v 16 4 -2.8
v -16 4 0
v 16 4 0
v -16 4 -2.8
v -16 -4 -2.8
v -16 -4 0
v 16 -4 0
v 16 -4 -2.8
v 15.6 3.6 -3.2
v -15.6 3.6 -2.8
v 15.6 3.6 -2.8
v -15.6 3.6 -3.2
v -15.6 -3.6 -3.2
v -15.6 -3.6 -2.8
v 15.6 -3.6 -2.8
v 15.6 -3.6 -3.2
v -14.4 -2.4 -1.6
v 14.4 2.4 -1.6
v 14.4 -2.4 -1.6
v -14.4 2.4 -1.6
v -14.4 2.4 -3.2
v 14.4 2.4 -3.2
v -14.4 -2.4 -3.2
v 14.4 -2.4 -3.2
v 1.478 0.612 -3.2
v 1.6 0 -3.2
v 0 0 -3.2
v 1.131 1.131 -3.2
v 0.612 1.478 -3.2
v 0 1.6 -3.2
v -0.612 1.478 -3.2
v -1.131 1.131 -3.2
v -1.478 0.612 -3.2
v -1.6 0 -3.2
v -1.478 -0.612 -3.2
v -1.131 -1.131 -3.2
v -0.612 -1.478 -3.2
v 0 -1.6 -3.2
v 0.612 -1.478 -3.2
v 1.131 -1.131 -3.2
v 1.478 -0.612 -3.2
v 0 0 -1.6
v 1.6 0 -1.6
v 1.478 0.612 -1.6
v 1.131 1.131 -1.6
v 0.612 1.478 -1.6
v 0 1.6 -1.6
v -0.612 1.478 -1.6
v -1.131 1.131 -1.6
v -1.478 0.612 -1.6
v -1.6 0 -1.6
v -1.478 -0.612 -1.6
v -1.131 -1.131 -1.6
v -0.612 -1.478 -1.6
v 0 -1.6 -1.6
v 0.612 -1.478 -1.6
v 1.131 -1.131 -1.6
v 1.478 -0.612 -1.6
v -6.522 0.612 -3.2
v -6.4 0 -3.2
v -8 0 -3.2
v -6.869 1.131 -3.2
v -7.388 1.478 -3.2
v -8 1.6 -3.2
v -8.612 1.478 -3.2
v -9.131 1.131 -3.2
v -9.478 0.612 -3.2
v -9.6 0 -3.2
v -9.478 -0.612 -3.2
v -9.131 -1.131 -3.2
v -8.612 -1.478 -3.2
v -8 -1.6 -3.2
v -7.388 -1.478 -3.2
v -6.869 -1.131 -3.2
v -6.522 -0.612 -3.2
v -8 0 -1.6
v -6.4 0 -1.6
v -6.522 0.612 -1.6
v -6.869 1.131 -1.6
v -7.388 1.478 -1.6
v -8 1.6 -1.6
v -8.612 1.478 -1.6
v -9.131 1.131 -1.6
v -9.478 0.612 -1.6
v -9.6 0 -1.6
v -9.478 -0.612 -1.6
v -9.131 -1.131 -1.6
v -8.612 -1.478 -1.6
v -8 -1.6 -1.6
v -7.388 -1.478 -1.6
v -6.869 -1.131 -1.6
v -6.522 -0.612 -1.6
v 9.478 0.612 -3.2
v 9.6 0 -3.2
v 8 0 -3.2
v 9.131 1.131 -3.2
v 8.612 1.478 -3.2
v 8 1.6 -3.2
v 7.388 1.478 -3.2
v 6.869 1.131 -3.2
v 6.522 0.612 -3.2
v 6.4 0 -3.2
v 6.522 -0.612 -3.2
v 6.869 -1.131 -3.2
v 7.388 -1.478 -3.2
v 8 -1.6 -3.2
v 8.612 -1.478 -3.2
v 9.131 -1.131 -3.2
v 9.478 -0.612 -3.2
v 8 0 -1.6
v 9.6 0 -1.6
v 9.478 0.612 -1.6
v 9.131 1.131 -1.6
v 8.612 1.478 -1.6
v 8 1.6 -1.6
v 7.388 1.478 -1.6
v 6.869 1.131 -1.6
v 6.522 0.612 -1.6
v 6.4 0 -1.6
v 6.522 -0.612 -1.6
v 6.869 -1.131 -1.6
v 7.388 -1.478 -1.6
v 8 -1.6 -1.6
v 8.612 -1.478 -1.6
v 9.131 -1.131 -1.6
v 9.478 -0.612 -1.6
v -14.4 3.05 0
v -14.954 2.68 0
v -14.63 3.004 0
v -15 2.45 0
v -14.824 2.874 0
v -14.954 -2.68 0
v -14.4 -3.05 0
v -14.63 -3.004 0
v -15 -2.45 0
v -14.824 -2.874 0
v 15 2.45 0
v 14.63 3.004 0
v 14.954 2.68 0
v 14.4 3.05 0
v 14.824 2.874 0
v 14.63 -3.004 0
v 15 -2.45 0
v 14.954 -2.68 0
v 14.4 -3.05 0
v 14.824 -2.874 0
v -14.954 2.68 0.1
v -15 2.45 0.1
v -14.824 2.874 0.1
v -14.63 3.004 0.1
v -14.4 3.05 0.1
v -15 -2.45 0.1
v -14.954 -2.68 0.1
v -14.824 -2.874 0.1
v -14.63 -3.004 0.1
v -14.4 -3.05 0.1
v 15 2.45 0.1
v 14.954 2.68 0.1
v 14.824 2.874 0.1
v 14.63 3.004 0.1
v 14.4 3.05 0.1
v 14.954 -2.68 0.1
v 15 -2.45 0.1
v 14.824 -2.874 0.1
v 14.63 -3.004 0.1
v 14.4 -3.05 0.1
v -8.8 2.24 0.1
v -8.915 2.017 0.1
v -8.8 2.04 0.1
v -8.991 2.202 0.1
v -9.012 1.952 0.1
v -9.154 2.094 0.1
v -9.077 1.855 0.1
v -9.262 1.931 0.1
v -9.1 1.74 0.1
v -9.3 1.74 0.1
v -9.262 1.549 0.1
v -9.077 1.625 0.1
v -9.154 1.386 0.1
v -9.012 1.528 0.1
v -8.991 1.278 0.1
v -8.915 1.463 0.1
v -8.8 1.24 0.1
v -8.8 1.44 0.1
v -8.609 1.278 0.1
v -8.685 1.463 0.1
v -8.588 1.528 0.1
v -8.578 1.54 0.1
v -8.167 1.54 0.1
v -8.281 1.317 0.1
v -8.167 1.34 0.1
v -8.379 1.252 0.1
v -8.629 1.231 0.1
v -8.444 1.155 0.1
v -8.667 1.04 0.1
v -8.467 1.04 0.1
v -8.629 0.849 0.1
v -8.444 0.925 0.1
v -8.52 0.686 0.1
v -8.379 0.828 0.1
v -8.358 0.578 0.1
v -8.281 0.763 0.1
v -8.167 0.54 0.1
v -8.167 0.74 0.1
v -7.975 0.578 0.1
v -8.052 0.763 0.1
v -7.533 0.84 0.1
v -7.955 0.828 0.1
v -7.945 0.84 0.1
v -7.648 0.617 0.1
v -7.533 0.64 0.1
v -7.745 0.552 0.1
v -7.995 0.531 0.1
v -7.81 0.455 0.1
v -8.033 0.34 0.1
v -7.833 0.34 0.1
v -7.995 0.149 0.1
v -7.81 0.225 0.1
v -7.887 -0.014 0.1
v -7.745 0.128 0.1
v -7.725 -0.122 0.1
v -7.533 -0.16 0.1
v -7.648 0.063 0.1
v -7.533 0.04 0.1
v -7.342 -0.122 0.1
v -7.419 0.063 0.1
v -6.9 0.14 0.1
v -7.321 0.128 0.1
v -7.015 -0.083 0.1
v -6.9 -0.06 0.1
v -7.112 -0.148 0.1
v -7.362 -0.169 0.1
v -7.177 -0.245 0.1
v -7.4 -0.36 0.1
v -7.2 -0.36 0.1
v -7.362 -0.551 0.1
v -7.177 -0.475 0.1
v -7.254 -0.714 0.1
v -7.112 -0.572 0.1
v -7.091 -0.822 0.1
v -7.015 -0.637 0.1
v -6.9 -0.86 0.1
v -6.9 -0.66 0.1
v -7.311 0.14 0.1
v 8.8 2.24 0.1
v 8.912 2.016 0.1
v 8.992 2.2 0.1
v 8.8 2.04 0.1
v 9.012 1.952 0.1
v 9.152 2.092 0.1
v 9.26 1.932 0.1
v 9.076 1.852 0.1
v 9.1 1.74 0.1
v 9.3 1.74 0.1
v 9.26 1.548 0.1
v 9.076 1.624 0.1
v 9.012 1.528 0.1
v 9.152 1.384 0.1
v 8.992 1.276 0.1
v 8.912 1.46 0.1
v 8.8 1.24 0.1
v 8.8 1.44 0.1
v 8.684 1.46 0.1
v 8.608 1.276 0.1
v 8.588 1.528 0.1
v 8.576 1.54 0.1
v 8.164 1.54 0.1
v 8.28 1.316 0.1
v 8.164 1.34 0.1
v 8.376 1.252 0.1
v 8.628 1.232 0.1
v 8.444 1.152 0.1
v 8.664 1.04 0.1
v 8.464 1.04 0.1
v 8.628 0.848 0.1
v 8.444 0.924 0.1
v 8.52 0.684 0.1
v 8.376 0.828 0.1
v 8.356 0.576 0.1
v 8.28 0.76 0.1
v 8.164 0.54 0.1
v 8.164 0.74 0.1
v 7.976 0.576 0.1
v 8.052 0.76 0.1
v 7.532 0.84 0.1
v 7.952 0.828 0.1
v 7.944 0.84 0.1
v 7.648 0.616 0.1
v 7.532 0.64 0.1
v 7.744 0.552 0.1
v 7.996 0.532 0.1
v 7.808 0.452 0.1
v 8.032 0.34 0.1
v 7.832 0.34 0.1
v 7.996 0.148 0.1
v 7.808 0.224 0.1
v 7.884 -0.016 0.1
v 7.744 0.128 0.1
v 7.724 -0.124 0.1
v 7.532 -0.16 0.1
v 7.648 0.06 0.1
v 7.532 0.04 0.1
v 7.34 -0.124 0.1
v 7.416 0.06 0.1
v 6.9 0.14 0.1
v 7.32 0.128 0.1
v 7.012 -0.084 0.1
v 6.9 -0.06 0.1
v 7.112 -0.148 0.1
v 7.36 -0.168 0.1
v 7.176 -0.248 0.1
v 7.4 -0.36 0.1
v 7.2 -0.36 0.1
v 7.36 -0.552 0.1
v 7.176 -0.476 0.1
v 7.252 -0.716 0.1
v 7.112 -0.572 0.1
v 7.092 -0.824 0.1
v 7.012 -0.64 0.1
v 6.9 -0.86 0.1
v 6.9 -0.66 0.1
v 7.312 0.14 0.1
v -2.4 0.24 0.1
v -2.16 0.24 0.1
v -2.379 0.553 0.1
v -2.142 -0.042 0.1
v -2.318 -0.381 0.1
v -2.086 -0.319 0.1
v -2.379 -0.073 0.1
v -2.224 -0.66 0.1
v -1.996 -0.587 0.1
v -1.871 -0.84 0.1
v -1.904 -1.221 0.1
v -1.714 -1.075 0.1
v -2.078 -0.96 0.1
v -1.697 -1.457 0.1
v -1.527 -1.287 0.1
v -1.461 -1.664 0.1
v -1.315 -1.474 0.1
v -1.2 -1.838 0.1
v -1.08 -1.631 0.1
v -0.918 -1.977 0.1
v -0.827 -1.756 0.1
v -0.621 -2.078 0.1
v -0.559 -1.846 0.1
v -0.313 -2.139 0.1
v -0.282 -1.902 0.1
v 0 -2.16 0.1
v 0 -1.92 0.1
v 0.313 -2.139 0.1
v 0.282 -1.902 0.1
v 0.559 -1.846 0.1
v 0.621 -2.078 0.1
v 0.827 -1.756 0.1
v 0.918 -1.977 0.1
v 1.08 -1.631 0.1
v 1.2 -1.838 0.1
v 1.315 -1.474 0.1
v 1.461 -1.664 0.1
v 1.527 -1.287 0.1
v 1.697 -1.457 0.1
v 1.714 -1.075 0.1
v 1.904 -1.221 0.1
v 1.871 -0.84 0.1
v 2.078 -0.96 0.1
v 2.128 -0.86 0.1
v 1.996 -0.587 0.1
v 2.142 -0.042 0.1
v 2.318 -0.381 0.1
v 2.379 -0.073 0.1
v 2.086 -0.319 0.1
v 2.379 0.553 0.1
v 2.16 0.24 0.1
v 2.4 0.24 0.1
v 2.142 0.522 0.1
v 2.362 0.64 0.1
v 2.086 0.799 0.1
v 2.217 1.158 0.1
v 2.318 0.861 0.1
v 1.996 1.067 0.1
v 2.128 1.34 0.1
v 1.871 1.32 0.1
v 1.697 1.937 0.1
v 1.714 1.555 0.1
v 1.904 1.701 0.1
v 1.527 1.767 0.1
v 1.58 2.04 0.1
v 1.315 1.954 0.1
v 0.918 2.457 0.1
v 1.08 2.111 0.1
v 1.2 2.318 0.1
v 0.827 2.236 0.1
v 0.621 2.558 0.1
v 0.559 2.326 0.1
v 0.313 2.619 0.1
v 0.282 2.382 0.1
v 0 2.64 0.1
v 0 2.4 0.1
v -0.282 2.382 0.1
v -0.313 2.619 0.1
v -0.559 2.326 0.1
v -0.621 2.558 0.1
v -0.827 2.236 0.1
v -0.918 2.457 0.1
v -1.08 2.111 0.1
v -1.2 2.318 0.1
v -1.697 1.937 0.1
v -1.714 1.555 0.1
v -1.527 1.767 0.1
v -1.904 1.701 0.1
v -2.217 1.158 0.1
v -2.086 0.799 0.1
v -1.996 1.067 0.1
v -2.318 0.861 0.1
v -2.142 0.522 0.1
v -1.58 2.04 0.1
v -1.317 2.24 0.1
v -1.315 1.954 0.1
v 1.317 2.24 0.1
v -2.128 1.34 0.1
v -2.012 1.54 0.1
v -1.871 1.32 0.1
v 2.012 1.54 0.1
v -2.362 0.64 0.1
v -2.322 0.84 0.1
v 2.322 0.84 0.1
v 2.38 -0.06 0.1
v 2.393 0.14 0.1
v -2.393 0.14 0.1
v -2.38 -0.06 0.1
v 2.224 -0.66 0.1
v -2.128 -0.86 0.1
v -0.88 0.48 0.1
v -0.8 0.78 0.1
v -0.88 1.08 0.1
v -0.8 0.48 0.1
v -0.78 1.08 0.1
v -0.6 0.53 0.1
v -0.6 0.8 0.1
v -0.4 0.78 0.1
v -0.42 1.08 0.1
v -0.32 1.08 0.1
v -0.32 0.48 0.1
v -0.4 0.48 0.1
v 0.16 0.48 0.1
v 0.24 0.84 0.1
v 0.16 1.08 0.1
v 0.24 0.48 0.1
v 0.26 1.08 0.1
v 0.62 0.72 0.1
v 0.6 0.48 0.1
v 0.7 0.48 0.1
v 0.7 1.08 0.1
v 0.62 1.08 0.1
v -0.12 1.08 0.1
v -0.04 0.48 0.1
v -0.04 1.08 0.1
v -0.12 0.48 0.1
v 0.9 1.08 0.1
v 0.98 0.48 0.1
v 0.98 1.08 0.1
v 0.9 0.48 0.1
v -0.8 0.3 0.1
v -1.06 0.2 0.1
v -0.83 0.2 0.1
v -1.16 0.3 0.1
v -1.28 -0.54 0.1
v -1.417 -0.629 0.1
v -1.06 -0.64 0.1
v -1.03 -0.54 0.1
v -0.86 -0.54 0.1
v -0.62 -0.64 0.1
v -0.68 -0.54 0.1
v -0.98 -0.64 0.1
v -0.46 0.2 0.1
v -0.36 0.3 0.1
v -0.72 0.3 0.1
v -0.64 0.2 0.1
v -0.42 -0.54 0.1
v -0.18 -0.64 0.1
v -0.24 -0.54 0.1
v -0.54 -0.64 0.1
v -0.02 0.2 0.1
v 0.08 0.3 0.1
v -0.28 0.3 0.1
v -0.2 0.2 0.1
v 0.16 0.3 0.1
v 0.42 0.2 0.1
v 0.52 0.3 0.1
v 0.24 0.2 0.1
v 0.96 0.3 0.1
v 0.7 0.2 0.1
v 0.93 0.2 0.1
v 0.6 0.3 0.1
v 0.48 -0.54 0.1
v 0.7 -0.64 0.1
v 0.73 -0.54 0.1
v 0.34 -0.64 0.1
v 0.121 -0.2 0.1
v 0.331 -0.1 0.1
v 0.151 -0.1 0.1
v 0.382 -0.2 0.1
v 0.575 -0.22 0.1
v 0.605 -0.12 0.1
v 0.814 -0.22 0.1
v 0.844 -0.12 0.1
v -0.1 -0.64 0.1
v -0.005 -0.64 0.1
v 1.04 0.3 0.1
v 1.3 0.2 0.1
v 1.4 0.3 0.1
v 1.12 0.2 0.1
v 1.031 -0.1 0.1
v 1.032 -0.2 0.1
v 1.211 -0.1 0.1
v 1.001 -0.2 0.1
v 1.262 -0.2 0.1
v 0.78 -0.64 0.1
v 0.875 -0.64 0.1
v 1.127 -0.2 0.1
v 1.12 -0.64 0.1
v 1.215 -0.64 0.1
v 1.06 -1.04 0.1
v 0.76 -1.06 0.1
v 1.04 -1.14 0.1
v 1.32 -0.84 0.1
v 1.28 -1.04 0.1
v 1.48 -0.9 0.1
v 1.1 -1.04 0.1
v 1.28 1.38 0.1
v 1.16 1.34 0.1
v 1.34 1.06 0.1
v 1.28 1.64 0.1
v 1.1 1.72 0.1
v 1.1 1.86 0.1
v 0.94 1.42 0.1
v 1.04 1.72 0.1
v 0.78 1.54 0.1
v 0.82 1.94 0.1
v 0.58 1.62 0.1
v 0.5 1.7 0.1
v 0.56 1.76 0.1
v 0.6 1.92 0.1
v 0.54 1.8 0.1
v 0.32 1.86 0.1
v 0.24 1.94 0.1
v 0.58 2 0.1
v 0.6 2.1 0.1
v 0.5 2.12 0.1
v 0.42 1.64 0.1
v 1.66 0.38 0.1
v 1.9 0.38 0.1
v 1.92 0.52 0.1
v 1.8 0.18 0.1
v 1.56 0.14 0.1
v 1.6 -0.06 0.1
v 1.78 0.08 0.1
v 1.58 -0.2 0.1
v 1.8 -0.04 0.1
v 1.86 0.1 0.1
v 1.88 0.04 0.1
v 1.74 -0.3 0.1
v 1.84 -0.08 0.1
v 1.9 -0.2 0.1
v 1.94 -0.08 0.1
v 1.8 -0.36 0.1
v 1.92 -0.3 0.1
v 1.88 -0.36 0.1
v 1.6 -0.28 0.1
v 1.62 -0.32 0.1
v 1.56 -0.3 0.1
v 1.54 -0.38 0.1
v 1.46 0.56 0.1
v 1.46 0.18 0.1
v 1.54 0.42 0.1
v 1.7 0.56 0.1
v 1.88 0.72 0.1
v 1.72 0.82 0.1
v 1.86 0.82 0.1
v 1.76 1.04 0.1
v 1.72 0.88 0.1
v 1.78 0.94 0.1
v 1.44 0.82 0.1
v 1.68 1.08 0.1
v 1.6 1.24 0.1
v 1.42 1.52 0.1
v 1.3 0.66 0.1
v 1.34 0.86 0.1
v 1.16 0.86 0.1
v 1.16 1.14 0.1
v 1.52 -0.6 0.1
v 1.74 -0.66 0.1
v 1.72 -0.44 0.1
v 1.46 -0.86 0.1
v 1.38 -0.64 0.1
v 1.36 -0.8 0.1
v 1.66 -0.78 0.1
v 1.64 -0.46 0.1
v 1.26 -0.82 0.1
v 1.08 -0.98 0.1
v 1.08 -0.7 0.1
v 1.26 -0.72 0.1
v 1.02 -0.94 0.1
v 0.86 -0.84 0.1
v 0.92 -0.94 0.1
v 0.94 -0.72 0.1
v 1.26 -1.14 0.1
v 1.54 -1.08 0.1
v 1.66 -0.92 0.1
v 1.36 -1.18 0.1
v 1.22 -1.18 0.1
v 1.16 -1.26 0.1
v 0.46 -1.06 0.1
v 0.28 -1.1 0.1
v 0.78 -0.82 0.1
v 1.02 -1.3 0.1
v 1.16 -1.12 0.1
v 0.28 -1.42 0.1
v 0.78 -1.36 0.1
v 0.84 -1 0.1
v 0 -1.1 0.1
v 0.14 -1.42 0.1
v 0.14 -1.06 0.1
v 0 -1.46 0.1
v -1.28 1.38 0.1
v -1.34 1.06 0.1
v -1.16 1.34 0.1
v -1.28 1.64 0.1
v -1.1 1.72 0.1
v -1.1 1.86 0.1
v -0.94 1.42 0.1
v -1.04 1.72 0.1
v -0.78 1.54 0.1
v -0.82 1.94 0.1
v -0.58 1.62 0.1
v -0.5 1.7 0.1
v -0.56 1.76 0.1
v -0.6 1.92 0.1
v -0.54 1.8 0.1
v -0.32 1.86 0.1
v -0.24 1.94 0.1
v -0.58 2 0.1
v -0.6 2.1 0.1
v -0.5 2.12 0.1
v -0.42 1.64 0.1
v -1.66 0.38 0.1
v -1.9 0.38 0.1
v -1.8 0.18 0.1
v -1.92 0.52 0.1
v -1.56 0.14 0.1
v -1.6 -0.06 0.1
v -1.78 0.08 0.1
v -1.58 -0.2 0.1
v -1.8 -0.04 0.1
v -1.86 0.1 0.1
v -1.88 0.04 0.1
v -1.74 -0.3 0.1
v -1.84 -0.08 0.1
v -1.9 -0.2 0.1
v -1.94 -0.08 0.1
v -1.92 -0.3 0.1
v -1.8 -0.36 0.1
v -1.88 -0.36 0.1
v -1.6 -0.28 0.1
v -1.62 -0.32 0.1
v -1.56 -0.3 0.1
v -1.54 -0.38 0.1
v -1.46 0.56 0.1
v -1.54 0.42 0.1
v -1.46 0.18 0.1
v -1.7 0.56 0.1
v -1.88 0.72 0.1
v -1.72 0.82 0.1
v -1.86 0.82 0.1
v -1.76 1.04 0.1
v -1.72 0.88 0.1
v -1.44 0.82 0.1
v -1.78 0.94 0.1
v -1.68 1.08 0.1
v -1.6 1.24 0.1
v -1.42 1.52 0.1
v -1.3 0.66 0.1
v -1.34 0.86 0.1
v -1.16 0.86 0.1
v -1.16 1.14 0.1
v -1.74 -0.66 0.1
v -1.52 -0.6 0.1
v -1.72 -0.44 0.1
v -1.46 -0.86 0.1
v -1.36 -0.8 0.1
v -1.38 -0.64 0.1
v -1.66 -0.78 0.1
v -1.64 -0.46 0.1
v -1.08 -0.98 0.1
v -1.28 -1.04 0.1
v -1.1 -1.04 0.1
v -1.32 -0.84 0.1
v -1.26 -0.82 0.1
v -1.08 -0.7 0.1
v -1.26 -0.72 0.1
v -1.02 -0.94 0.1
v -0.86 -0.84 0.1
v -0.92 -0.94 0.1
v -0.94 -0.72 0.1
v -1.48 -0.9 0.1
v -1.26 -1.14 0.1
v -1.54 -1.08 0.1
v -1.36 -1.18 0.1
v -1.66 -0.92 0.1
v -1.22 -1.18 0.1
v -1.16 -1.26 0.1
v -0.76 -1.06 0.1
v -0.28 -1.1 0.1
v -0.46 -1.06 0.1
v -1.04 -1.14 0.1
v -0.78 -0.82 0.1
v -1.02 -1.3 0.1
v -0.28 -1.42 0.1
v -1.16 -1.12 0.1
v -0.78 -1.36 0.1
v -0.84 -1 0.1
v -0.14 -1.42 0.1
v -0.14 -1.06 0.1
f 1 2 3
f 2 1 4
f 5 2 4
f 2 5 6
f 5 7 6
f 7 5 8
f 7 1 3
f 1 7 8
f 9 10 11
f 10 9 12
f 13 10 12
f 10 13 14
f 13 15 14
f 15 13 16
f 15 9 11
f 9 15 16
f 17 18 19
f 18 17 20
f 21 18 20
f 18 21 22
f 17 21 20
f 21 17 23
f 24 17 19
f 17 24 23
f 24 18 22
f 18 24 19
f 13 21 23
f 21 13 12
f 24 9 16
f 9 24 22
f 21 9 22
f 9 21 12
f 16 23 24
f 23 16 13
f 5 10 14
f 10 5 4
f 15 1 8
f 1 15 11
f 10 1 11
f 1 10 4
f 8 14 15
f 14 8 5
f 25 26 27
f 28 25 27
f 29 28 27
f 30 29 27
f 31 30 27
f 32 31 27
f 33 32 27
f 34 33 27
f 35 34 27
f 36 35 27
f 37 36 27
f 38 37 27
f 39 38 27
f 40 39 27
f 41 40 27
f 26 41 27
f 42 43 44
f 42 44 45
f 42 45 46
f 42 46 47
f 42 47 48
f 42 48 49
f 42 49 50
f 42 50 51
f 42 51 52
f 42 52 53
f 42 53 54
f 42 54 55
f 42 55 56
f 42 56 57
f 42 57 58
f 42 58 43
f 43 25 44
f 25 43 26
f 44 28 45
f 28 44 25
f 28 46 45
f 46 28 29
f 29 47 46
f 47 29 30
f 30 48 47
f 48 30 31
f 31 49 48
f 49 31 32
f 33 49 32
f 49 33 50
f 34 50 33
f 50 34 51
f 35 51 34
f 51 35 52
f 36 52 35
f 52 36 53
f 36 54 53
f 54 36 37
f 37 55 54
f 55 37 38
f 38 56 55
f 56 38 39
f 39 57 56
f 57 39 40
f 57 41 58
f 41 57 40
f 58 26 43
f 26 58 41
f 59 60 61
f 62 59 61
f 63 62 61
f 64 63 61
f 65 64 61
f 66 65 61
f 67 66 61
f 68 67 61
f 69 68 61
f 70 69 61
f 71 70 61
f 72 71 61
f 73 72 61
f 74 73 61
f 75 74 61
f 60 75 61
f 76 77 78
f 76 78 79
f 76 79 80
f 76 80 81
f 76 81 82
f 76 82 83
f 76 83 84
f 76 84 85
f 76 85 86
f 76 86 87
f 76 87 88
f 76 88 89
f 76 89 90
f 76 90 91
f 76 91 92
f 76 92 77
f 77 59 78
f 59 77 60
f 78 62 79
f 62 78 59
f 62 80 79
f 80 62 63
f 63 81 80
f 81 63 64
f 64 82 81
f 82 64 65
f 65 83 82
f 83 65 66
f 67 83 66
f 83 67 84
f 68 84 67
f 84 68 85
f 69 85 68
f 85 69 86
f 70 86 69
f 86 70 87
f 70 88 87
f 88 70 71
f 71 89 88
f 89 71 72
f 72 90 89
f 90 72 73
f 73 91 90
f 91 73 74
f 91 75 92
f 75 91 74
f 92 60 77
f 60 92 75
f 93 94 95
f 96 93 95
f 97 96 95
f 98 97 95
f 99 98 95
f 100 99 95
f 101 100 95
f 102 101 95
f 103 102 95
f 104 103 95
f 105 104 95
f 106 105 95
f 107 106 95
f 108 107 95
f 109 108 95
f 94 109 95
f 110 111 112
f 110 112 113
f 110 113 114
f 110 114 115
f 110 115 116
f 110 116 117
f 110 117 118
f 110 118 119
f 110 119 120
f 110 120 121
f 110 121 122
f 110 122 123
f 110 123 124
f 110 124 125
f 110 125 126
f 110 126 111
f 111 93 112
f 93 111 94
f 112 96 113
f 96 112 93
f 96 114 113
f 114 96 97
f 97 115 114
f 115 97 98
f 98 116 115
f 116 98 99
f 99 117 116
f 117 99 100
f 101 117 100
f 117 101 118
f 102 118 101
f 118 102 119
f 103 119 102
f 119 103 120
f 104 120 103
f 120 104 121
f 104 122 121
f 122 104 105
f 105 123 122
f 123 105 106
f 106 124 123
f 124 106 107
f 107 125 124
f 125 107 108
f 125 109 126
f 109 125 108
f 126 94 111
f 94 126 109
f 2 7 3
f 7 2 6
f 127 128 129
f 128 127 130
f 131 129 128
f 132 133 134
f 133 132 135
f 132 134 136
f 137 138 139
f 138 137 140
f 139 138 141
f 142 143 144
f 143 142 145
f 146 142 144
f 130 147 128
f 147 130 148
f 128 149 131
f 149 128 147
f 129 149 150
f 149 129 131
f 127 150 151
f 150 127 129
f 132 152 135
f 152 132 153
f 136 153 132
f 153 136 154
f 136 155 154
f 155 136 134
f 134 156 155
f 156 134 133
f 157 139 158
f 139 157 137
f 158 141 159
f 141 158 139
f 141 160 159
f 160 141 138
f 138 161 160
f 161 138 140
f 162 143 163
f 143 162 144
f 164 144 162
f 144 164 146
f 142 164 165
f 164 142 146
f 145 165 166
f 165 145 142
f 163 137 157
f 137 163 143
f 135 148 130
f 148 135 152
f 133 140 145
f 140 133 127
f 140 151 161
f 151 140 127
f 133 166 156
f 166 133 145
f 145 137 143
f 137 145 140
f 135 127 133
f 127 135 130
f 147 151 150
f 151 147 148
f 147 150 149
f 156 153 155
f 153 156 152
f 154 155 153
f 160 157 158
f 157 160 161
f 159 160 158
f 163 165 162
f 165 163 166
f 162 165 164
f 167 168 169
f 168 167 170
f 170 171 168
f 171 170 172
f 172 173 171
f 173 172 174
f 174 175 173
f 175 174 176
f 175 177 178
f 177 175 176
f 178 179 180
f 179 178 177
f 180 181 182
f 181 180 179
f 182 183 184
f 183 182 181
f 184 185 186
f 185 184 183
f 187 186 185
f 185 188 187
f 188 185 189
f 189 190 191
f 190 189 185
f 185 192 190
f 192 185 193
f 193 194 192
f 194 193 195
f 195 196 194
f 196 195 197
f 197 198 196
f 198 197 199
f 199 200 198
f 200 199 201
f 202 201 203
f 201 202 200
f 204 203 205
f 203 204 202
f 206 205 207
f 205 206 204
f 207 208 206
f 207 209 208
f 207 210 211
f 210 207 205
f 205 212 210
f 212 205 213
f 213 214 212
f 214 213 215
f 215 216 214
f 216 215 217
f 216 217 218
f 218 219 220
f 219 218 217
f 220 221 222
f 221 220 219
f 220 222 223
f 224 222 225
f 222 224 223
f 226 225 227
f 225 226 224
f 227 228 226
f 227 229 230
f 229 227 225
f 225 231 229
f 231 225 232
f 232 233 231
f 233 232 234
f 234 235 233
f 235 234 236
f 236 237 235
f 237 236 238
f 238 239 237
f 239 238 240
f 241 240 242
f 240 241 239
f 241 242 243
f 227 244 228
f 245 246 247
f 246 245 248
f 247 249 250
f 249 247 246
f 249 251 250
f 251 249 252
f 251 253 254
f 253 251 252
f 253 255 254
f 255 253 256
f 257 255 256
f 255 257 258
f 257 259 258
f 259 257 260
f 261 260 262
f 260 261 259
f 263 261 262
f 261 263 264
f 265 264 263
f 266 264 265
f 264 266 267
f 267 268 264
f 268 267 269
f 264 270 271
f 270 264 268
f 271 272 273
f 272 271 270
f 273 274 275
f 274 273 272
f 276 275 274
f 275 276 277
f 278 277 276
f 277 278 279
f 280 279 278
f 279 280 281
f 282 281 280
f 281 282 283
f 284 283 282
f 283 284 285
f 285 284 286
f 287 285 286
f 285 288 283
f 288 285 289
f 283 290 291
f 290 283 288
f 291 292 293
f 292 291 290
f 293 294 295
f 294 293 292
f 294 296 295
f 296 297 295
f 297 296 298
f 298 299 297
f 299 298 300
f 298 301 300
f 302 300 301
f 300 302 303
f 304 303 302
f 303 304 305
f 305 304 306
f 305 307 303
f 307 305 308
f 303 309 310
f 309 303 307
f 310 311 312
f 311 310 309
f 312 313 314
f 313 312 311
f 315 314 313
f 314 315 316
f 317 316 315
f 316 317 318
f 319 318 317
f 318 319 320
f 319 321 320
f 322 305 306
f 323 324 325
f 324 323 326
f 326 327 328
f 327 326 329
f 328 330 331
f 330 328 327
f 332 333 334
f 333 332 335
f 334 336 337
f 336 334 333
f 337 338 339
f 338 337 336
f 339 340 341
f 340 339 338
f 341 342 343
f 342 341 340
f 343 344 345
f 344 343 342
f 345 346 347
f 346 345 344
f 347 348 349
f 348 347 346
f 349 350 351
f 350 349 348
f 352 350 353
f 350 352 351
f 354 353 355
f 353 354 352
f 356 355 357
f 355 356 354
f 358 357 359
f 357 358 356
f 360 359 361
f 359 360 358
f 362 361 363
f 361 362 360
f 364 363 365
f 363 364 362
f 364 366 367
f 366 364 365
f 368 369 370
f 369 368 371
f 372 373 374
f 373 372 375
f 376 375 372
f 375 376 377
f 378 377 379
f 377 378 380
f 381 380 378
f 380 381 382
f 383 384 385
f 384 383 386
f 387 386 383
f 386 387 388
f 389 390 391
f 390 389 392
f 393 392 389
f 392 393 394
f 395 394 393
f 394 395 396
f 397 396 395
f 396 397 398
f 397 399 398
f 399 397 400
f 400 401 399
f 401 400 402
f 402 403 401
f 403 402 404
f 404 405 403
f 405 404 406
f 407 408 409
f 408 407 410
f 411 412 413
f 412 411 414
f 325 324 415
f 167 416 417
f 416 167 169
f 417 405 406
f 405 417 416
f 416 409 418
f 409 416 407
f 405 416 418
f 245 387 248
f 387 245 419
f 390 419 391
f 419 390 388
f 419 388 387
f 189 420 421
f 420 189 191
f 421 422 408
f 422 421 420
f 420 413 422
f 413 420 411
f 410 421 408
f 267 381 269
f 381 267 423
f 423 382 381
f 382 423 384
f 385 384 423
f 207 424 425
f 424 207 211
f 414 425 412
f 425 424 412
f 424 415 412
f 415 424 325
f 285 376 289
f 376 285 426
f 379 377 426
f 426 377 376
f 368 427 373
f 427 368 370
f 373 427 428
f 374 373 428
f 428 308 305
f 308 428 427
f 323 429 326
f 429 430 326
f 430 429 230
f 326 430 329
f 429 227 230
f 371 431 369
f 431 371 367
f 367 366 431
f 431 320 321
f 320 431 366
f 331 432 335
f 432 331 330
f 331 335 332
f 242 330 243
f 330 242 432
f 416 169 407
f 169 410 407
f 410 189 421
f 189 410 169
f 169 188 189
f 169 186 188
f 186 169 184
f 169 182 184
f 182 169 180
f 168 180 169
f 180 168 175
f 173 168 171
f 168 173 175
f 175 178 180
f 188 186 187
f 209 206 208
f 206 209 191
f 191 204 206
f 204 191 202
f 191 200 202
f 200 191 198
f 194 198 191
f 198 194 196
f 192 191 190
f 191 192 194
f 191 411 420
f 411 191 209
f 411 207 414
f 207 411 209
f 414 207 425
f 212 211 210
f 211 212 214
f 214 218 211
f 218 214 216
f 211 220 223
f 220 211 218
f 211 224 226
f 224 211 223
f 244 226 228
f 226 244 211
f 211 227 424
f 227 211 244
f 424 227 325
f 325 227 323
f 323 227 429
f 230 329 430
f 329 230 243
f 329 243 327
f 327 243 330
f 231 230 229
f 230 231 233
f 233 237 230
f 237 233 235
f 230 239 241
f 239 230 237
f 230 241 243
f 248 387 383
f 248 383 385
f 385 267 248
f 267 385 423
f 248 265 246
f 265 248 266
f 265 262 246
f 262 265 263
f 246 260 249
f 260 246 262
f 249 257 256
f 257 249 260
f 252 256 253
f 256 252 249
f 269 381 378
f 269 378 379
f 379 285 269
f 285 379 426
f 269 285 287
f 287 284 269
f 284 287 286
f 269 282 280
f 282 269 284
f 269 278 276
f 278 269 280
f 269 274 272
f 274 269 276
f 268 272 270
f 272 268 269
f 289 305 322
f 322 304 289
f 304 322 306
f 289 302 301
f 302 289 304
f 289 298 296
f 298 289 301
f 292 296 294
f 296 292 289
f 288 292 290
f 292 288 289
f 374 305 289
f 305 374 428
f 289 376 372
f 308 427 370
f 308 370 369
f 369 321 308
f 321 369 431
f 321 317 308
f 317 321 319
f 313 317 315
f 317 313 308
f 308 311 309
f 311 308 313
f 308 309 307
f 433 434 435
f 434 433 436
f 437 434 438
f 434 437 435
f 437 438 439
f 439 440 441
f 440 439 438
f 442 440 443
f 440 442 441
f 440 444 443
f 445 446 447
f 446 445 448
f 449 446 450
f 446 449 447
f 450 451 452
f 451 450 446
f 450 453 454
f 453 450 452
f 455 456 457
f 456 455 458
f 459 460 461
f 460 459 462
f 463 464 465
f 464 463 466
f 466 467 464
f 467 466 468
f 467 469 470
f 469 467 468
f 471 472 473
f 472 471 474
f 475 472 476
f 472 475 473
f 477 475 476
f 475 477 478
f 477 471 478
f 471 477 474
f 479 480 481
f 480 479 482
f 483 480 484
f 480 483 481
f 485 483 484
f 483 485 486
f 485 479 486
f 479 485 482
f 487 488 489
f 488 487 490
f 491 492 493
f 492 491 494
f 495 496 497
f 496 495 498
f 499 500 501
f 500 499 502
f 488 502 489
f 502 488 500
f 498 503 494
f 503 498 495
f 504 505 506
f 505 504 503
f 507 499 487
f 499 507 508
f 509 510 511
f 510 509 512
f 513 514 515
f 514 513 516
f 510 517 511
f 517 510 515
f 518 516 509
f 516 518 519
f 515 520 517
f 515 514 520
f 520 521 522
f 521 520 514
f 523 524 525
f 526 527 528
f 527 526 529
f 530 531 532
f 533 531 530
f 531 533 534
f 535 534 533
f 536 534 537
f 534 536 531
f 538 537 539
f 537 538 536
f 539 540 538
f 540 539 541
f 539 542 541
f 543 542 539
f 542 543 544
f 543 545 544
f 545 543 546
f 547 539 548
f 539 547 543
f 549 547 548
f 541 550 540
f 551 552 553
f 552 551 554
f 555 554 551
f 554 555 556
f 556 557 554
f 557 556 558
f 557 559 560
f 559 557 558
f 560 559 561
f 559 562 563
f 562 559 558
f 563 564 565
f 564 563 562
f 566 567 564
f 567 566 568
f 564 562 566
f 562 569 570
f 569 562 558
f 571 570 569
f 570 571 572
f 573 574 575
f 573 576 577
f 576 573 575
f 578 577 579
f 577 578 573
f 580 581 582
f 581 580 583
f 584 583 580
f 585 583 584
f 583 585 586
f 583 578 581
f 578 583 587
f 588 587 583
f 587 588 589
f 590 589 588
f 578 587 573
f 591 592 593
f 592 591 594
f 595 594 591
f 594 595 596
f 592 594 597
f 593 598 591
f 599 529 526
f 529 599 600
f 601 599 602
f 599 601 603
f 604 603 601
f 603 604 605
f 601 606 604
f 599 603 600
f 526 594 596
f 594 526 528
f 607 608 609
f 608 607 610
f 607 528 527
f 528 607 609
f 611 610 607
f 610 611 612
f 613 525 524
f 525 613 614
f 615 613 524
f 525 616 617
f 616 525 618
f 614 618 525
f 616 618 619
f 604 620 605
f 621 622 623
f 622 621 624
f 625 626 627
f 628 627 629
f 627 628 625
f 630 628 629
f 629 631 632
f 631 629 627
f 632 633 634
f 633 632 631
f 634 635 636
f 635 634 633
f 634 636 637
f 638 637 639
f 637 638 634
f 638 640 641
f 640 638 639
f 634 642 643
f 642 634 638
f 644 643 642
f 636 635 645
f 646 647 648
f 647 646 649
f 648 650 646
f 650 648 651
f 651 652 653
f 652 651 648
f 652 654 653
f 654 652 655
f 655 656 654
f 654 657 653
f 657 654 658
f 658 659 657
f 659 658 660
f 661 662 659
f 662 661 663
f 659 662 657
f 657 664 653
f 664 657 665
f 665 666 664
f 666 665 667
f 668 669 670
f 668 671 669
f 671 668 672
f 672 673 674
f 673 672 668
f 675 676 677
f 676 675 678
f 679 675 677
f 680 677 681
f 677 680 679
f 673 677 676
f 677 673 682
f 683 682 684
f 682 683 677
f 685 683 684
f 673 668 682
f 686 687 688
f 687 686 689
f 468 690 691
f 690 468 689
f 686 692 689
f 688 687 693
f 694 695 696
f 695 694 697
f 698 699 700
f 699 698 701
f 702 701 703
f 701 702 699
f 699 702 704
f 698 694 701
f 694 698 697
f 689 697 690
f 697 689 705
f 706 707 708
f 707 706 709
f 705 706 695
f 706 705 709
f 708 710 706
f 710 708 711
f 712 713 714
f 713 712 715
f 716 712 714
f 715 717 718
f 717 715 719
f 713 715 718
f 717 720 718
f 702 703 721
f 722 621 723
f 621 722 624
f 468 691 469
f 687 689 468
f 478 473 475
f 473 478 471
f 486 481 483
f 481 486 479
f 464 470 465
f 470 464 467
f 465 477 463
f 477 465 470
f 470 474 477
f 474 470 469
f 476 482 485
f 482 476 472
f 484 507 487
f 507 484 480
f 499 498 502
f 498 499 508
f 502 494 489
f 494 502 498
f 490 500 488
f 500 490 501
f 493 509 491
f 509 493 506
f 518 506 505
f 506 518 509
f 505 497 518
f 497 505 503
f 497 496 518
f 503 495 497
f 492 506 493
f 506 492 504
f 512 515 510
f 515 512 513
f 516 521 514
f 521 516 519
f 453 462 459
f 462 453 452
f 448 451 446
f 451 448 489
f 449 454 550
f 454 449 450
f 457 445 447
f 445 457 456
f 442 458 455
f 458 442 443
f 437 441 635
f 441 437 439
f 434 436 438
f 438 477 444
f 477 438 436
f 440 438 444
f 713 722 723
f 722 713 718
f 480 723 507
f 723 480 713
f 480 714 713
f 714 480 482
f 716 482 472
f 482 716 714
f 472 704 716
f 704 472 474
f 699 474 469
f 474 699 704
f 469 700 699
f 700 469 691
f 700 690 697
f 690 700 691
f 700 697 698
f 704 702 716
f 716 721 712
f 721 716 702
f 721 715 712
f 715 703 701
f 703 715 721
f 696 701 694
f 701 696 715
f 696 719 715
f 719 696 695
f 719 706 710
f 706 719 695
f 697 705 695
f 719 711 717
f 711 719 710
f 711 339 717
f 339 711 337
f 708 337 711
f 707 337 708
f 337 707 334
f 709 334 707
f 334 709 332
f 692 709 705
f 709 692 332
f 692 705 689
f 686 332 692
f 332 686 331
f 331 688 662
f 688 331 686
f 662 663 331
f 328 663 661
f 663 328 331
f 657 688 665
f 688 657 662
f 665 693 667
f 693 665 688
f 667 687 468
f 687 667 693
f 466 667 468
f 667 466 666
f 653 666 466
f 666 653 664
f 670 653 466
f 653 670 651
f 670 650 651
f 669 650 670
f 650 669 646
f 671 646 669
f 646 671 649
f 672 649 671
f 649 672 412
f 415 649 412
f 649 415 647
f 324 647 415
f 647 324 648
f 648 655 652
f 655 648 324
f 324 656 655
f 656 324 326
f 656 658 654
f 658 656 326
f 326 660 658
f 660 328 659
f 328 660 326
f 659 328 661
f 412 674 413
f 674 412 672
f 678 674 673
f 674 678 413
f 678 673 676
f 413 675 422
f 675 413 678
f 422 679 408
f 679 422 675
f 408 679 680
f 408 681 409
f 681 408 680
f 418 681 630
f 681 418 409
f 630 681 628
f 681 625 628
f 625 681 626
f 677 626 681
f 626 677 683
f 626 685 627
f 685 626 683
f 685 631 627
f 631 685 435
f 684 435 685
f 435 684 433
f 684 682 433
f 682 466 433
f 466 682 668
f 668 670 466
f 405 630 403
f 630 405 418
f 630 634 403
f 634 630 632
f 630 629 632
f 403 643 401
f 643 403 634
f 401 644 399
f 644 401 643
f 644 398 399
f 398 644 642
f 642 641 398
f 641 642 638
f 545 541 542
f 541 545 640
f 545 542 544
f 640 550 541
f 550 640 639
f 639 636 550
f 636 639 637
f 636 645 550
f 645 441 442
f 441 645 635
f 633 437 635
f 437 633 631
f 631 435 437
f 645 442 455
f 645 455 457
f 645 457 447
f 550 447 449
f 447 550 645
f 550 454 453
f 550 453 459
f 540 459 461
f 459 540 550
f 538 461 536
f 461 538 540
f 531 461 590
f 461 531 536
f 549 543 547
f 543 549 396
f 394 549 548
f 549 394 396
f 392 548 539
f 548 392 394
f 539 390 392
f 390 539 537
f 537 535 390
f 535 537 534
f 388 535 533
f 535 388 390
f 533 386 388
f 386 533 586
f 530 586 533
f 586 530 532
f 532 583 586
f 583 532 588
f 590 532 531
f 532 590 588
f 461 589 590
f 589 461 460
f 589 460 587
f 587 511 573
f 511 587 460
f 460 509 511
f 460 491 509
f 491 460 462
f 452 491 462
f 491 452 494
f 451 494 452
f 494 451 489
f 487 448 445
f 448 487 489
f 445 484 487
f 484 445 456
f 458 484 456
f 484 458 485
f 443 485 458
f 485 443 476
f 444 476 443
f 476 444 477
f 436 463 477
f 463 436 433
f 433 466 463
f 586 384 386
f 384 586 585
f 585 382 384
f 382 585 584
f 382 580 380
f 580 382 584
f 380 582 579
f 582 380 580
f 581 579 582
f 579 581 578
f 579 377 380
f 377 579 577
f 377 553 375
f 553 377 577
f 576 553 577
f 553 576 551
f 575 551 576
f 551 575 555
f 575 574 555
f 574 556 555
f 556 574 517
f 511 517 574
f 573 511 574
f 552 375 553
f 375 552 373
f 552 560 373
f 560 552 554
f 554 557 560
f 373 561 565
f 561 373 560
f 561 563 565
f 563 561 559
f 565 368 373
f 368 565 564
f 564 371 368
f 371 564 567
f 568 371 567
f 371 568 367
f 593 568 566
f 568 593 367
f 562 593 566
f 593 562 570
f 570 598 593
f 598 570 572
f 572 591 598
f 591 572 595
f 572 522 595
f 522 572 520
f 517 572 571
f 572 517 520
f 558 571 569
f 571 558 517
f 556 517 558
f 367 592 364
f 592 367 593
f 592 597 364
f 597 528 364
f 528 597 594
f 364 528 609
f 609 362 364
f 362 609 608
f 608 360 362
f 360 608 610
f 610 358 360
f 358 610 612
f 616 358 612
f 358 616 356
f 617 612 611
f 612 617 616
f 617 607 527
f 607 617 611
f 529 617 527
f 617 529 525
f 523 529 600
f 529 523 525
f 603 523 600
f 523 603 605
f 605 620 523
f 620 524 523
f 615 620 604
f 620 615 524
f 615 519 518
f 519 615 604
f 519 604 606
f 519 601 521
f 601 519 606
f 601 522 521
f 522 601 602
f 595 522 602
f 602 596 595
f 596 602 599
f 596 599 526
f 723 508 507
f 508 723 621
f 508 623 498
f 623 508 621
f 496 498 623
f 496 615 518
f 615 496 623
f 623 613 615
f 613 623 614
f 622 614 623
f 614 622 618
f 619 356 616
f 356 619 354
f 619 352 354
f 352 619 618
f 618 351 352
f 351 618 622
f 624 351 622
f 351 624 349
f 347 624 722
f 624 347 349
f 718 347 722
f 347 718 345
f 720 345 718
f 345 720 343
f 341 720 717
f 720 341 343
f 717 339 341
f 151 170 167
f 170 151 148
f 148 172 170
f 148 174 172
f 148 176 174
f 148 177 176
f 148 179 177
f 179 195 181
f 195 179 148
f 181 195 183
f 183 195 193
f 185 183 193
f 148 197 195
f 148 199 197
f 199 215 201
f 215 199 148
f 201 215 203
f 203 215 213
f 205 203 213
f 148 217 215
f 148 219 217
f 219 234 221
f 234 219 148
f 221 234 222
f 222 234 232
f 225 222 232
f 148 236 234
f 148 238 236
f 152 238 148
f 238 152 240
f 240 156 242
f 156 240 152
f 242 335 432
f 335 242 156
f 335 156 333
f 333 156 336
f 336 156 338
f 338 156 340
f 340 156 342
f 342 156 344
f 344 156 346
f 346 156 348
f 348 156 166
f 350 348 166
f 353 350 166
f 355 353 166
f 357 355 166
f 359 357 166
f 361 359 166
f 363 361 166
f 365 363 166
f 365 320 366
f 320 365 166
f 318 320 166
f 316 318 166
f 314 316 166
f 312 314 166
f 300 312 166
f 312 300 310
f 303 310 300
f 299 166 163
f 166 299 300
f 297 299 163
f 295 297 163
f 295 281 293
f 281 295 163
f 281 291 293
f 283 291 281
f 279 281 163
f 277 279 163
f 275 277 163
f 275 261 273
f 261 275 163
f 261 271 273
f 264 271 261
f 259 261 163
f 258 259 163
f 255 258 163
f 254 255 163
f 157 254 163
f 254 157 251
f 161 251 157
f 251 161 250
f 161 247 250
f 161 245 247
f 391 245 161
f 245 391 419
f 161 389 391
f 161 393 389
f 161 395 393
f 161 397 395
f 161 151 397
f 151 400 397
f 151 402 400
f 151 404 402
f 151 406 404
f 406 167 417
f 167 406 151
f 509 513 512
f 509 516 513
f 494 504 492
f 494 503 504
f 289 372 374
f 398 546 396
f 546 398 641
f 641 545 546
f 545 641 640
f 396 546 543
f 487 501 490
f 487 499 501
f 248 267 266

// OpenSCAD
use <../lib.scad>
use <2431.scad>
use <6055874a.scad>
function ldraw_lib__2431d06() = [
// 0 Tile 1 x 4 with Radiator Grille and Mini Cooper Logo Sticker
// 0 Name: 2431d06.dat
// 0 Author: Evert-Jan Boer [ejboer]
// 0 !LDRAW_ORG Shortcut UPDATE 2024-08
// 0 !LICENSE Licensed under CC BY 4.0 : see CAreadme.txt
// 
// 0 BFC CERTIFY CCW
  [0,"BFC","CERTIFY"],
  [0,"BFC","CCW"],
// 
// 0 !CATEGORY Sticker Shortcut
// 0 !KEYWORDS Bricklink 2431pb566, Mini Cooper, set 10242
// 
// 0 !HISTORY 2024-09-30 [OrionP] Official Update 2024-08
// 
// 1 16 0 0 0 1 0 0 0 1 0 0 0 1 2431.dat
  [1,16,0,0,0,1,0,0,0,1,0,0,0,1, ldraw_lib__2431()],
// 1 16 0 0 0 1 0 0 0 1 0 0 0 1 6055874a.dat
  [1,16,0,0,0,1,0,0,0,1,0,0,0,1, ldraw_lib__6055874a()],
];
module ldraw_lib__2431d06(step=0, col=false, unit=2/5, alt=false, line=0.2, solid=!$preview)
    makepoly(ldraw_lib__2431d06(), step=step, col=col, unit=unit, alt=alt, line=line, solid=solid);
ldraw_lib__2431d06(line=0.2);
